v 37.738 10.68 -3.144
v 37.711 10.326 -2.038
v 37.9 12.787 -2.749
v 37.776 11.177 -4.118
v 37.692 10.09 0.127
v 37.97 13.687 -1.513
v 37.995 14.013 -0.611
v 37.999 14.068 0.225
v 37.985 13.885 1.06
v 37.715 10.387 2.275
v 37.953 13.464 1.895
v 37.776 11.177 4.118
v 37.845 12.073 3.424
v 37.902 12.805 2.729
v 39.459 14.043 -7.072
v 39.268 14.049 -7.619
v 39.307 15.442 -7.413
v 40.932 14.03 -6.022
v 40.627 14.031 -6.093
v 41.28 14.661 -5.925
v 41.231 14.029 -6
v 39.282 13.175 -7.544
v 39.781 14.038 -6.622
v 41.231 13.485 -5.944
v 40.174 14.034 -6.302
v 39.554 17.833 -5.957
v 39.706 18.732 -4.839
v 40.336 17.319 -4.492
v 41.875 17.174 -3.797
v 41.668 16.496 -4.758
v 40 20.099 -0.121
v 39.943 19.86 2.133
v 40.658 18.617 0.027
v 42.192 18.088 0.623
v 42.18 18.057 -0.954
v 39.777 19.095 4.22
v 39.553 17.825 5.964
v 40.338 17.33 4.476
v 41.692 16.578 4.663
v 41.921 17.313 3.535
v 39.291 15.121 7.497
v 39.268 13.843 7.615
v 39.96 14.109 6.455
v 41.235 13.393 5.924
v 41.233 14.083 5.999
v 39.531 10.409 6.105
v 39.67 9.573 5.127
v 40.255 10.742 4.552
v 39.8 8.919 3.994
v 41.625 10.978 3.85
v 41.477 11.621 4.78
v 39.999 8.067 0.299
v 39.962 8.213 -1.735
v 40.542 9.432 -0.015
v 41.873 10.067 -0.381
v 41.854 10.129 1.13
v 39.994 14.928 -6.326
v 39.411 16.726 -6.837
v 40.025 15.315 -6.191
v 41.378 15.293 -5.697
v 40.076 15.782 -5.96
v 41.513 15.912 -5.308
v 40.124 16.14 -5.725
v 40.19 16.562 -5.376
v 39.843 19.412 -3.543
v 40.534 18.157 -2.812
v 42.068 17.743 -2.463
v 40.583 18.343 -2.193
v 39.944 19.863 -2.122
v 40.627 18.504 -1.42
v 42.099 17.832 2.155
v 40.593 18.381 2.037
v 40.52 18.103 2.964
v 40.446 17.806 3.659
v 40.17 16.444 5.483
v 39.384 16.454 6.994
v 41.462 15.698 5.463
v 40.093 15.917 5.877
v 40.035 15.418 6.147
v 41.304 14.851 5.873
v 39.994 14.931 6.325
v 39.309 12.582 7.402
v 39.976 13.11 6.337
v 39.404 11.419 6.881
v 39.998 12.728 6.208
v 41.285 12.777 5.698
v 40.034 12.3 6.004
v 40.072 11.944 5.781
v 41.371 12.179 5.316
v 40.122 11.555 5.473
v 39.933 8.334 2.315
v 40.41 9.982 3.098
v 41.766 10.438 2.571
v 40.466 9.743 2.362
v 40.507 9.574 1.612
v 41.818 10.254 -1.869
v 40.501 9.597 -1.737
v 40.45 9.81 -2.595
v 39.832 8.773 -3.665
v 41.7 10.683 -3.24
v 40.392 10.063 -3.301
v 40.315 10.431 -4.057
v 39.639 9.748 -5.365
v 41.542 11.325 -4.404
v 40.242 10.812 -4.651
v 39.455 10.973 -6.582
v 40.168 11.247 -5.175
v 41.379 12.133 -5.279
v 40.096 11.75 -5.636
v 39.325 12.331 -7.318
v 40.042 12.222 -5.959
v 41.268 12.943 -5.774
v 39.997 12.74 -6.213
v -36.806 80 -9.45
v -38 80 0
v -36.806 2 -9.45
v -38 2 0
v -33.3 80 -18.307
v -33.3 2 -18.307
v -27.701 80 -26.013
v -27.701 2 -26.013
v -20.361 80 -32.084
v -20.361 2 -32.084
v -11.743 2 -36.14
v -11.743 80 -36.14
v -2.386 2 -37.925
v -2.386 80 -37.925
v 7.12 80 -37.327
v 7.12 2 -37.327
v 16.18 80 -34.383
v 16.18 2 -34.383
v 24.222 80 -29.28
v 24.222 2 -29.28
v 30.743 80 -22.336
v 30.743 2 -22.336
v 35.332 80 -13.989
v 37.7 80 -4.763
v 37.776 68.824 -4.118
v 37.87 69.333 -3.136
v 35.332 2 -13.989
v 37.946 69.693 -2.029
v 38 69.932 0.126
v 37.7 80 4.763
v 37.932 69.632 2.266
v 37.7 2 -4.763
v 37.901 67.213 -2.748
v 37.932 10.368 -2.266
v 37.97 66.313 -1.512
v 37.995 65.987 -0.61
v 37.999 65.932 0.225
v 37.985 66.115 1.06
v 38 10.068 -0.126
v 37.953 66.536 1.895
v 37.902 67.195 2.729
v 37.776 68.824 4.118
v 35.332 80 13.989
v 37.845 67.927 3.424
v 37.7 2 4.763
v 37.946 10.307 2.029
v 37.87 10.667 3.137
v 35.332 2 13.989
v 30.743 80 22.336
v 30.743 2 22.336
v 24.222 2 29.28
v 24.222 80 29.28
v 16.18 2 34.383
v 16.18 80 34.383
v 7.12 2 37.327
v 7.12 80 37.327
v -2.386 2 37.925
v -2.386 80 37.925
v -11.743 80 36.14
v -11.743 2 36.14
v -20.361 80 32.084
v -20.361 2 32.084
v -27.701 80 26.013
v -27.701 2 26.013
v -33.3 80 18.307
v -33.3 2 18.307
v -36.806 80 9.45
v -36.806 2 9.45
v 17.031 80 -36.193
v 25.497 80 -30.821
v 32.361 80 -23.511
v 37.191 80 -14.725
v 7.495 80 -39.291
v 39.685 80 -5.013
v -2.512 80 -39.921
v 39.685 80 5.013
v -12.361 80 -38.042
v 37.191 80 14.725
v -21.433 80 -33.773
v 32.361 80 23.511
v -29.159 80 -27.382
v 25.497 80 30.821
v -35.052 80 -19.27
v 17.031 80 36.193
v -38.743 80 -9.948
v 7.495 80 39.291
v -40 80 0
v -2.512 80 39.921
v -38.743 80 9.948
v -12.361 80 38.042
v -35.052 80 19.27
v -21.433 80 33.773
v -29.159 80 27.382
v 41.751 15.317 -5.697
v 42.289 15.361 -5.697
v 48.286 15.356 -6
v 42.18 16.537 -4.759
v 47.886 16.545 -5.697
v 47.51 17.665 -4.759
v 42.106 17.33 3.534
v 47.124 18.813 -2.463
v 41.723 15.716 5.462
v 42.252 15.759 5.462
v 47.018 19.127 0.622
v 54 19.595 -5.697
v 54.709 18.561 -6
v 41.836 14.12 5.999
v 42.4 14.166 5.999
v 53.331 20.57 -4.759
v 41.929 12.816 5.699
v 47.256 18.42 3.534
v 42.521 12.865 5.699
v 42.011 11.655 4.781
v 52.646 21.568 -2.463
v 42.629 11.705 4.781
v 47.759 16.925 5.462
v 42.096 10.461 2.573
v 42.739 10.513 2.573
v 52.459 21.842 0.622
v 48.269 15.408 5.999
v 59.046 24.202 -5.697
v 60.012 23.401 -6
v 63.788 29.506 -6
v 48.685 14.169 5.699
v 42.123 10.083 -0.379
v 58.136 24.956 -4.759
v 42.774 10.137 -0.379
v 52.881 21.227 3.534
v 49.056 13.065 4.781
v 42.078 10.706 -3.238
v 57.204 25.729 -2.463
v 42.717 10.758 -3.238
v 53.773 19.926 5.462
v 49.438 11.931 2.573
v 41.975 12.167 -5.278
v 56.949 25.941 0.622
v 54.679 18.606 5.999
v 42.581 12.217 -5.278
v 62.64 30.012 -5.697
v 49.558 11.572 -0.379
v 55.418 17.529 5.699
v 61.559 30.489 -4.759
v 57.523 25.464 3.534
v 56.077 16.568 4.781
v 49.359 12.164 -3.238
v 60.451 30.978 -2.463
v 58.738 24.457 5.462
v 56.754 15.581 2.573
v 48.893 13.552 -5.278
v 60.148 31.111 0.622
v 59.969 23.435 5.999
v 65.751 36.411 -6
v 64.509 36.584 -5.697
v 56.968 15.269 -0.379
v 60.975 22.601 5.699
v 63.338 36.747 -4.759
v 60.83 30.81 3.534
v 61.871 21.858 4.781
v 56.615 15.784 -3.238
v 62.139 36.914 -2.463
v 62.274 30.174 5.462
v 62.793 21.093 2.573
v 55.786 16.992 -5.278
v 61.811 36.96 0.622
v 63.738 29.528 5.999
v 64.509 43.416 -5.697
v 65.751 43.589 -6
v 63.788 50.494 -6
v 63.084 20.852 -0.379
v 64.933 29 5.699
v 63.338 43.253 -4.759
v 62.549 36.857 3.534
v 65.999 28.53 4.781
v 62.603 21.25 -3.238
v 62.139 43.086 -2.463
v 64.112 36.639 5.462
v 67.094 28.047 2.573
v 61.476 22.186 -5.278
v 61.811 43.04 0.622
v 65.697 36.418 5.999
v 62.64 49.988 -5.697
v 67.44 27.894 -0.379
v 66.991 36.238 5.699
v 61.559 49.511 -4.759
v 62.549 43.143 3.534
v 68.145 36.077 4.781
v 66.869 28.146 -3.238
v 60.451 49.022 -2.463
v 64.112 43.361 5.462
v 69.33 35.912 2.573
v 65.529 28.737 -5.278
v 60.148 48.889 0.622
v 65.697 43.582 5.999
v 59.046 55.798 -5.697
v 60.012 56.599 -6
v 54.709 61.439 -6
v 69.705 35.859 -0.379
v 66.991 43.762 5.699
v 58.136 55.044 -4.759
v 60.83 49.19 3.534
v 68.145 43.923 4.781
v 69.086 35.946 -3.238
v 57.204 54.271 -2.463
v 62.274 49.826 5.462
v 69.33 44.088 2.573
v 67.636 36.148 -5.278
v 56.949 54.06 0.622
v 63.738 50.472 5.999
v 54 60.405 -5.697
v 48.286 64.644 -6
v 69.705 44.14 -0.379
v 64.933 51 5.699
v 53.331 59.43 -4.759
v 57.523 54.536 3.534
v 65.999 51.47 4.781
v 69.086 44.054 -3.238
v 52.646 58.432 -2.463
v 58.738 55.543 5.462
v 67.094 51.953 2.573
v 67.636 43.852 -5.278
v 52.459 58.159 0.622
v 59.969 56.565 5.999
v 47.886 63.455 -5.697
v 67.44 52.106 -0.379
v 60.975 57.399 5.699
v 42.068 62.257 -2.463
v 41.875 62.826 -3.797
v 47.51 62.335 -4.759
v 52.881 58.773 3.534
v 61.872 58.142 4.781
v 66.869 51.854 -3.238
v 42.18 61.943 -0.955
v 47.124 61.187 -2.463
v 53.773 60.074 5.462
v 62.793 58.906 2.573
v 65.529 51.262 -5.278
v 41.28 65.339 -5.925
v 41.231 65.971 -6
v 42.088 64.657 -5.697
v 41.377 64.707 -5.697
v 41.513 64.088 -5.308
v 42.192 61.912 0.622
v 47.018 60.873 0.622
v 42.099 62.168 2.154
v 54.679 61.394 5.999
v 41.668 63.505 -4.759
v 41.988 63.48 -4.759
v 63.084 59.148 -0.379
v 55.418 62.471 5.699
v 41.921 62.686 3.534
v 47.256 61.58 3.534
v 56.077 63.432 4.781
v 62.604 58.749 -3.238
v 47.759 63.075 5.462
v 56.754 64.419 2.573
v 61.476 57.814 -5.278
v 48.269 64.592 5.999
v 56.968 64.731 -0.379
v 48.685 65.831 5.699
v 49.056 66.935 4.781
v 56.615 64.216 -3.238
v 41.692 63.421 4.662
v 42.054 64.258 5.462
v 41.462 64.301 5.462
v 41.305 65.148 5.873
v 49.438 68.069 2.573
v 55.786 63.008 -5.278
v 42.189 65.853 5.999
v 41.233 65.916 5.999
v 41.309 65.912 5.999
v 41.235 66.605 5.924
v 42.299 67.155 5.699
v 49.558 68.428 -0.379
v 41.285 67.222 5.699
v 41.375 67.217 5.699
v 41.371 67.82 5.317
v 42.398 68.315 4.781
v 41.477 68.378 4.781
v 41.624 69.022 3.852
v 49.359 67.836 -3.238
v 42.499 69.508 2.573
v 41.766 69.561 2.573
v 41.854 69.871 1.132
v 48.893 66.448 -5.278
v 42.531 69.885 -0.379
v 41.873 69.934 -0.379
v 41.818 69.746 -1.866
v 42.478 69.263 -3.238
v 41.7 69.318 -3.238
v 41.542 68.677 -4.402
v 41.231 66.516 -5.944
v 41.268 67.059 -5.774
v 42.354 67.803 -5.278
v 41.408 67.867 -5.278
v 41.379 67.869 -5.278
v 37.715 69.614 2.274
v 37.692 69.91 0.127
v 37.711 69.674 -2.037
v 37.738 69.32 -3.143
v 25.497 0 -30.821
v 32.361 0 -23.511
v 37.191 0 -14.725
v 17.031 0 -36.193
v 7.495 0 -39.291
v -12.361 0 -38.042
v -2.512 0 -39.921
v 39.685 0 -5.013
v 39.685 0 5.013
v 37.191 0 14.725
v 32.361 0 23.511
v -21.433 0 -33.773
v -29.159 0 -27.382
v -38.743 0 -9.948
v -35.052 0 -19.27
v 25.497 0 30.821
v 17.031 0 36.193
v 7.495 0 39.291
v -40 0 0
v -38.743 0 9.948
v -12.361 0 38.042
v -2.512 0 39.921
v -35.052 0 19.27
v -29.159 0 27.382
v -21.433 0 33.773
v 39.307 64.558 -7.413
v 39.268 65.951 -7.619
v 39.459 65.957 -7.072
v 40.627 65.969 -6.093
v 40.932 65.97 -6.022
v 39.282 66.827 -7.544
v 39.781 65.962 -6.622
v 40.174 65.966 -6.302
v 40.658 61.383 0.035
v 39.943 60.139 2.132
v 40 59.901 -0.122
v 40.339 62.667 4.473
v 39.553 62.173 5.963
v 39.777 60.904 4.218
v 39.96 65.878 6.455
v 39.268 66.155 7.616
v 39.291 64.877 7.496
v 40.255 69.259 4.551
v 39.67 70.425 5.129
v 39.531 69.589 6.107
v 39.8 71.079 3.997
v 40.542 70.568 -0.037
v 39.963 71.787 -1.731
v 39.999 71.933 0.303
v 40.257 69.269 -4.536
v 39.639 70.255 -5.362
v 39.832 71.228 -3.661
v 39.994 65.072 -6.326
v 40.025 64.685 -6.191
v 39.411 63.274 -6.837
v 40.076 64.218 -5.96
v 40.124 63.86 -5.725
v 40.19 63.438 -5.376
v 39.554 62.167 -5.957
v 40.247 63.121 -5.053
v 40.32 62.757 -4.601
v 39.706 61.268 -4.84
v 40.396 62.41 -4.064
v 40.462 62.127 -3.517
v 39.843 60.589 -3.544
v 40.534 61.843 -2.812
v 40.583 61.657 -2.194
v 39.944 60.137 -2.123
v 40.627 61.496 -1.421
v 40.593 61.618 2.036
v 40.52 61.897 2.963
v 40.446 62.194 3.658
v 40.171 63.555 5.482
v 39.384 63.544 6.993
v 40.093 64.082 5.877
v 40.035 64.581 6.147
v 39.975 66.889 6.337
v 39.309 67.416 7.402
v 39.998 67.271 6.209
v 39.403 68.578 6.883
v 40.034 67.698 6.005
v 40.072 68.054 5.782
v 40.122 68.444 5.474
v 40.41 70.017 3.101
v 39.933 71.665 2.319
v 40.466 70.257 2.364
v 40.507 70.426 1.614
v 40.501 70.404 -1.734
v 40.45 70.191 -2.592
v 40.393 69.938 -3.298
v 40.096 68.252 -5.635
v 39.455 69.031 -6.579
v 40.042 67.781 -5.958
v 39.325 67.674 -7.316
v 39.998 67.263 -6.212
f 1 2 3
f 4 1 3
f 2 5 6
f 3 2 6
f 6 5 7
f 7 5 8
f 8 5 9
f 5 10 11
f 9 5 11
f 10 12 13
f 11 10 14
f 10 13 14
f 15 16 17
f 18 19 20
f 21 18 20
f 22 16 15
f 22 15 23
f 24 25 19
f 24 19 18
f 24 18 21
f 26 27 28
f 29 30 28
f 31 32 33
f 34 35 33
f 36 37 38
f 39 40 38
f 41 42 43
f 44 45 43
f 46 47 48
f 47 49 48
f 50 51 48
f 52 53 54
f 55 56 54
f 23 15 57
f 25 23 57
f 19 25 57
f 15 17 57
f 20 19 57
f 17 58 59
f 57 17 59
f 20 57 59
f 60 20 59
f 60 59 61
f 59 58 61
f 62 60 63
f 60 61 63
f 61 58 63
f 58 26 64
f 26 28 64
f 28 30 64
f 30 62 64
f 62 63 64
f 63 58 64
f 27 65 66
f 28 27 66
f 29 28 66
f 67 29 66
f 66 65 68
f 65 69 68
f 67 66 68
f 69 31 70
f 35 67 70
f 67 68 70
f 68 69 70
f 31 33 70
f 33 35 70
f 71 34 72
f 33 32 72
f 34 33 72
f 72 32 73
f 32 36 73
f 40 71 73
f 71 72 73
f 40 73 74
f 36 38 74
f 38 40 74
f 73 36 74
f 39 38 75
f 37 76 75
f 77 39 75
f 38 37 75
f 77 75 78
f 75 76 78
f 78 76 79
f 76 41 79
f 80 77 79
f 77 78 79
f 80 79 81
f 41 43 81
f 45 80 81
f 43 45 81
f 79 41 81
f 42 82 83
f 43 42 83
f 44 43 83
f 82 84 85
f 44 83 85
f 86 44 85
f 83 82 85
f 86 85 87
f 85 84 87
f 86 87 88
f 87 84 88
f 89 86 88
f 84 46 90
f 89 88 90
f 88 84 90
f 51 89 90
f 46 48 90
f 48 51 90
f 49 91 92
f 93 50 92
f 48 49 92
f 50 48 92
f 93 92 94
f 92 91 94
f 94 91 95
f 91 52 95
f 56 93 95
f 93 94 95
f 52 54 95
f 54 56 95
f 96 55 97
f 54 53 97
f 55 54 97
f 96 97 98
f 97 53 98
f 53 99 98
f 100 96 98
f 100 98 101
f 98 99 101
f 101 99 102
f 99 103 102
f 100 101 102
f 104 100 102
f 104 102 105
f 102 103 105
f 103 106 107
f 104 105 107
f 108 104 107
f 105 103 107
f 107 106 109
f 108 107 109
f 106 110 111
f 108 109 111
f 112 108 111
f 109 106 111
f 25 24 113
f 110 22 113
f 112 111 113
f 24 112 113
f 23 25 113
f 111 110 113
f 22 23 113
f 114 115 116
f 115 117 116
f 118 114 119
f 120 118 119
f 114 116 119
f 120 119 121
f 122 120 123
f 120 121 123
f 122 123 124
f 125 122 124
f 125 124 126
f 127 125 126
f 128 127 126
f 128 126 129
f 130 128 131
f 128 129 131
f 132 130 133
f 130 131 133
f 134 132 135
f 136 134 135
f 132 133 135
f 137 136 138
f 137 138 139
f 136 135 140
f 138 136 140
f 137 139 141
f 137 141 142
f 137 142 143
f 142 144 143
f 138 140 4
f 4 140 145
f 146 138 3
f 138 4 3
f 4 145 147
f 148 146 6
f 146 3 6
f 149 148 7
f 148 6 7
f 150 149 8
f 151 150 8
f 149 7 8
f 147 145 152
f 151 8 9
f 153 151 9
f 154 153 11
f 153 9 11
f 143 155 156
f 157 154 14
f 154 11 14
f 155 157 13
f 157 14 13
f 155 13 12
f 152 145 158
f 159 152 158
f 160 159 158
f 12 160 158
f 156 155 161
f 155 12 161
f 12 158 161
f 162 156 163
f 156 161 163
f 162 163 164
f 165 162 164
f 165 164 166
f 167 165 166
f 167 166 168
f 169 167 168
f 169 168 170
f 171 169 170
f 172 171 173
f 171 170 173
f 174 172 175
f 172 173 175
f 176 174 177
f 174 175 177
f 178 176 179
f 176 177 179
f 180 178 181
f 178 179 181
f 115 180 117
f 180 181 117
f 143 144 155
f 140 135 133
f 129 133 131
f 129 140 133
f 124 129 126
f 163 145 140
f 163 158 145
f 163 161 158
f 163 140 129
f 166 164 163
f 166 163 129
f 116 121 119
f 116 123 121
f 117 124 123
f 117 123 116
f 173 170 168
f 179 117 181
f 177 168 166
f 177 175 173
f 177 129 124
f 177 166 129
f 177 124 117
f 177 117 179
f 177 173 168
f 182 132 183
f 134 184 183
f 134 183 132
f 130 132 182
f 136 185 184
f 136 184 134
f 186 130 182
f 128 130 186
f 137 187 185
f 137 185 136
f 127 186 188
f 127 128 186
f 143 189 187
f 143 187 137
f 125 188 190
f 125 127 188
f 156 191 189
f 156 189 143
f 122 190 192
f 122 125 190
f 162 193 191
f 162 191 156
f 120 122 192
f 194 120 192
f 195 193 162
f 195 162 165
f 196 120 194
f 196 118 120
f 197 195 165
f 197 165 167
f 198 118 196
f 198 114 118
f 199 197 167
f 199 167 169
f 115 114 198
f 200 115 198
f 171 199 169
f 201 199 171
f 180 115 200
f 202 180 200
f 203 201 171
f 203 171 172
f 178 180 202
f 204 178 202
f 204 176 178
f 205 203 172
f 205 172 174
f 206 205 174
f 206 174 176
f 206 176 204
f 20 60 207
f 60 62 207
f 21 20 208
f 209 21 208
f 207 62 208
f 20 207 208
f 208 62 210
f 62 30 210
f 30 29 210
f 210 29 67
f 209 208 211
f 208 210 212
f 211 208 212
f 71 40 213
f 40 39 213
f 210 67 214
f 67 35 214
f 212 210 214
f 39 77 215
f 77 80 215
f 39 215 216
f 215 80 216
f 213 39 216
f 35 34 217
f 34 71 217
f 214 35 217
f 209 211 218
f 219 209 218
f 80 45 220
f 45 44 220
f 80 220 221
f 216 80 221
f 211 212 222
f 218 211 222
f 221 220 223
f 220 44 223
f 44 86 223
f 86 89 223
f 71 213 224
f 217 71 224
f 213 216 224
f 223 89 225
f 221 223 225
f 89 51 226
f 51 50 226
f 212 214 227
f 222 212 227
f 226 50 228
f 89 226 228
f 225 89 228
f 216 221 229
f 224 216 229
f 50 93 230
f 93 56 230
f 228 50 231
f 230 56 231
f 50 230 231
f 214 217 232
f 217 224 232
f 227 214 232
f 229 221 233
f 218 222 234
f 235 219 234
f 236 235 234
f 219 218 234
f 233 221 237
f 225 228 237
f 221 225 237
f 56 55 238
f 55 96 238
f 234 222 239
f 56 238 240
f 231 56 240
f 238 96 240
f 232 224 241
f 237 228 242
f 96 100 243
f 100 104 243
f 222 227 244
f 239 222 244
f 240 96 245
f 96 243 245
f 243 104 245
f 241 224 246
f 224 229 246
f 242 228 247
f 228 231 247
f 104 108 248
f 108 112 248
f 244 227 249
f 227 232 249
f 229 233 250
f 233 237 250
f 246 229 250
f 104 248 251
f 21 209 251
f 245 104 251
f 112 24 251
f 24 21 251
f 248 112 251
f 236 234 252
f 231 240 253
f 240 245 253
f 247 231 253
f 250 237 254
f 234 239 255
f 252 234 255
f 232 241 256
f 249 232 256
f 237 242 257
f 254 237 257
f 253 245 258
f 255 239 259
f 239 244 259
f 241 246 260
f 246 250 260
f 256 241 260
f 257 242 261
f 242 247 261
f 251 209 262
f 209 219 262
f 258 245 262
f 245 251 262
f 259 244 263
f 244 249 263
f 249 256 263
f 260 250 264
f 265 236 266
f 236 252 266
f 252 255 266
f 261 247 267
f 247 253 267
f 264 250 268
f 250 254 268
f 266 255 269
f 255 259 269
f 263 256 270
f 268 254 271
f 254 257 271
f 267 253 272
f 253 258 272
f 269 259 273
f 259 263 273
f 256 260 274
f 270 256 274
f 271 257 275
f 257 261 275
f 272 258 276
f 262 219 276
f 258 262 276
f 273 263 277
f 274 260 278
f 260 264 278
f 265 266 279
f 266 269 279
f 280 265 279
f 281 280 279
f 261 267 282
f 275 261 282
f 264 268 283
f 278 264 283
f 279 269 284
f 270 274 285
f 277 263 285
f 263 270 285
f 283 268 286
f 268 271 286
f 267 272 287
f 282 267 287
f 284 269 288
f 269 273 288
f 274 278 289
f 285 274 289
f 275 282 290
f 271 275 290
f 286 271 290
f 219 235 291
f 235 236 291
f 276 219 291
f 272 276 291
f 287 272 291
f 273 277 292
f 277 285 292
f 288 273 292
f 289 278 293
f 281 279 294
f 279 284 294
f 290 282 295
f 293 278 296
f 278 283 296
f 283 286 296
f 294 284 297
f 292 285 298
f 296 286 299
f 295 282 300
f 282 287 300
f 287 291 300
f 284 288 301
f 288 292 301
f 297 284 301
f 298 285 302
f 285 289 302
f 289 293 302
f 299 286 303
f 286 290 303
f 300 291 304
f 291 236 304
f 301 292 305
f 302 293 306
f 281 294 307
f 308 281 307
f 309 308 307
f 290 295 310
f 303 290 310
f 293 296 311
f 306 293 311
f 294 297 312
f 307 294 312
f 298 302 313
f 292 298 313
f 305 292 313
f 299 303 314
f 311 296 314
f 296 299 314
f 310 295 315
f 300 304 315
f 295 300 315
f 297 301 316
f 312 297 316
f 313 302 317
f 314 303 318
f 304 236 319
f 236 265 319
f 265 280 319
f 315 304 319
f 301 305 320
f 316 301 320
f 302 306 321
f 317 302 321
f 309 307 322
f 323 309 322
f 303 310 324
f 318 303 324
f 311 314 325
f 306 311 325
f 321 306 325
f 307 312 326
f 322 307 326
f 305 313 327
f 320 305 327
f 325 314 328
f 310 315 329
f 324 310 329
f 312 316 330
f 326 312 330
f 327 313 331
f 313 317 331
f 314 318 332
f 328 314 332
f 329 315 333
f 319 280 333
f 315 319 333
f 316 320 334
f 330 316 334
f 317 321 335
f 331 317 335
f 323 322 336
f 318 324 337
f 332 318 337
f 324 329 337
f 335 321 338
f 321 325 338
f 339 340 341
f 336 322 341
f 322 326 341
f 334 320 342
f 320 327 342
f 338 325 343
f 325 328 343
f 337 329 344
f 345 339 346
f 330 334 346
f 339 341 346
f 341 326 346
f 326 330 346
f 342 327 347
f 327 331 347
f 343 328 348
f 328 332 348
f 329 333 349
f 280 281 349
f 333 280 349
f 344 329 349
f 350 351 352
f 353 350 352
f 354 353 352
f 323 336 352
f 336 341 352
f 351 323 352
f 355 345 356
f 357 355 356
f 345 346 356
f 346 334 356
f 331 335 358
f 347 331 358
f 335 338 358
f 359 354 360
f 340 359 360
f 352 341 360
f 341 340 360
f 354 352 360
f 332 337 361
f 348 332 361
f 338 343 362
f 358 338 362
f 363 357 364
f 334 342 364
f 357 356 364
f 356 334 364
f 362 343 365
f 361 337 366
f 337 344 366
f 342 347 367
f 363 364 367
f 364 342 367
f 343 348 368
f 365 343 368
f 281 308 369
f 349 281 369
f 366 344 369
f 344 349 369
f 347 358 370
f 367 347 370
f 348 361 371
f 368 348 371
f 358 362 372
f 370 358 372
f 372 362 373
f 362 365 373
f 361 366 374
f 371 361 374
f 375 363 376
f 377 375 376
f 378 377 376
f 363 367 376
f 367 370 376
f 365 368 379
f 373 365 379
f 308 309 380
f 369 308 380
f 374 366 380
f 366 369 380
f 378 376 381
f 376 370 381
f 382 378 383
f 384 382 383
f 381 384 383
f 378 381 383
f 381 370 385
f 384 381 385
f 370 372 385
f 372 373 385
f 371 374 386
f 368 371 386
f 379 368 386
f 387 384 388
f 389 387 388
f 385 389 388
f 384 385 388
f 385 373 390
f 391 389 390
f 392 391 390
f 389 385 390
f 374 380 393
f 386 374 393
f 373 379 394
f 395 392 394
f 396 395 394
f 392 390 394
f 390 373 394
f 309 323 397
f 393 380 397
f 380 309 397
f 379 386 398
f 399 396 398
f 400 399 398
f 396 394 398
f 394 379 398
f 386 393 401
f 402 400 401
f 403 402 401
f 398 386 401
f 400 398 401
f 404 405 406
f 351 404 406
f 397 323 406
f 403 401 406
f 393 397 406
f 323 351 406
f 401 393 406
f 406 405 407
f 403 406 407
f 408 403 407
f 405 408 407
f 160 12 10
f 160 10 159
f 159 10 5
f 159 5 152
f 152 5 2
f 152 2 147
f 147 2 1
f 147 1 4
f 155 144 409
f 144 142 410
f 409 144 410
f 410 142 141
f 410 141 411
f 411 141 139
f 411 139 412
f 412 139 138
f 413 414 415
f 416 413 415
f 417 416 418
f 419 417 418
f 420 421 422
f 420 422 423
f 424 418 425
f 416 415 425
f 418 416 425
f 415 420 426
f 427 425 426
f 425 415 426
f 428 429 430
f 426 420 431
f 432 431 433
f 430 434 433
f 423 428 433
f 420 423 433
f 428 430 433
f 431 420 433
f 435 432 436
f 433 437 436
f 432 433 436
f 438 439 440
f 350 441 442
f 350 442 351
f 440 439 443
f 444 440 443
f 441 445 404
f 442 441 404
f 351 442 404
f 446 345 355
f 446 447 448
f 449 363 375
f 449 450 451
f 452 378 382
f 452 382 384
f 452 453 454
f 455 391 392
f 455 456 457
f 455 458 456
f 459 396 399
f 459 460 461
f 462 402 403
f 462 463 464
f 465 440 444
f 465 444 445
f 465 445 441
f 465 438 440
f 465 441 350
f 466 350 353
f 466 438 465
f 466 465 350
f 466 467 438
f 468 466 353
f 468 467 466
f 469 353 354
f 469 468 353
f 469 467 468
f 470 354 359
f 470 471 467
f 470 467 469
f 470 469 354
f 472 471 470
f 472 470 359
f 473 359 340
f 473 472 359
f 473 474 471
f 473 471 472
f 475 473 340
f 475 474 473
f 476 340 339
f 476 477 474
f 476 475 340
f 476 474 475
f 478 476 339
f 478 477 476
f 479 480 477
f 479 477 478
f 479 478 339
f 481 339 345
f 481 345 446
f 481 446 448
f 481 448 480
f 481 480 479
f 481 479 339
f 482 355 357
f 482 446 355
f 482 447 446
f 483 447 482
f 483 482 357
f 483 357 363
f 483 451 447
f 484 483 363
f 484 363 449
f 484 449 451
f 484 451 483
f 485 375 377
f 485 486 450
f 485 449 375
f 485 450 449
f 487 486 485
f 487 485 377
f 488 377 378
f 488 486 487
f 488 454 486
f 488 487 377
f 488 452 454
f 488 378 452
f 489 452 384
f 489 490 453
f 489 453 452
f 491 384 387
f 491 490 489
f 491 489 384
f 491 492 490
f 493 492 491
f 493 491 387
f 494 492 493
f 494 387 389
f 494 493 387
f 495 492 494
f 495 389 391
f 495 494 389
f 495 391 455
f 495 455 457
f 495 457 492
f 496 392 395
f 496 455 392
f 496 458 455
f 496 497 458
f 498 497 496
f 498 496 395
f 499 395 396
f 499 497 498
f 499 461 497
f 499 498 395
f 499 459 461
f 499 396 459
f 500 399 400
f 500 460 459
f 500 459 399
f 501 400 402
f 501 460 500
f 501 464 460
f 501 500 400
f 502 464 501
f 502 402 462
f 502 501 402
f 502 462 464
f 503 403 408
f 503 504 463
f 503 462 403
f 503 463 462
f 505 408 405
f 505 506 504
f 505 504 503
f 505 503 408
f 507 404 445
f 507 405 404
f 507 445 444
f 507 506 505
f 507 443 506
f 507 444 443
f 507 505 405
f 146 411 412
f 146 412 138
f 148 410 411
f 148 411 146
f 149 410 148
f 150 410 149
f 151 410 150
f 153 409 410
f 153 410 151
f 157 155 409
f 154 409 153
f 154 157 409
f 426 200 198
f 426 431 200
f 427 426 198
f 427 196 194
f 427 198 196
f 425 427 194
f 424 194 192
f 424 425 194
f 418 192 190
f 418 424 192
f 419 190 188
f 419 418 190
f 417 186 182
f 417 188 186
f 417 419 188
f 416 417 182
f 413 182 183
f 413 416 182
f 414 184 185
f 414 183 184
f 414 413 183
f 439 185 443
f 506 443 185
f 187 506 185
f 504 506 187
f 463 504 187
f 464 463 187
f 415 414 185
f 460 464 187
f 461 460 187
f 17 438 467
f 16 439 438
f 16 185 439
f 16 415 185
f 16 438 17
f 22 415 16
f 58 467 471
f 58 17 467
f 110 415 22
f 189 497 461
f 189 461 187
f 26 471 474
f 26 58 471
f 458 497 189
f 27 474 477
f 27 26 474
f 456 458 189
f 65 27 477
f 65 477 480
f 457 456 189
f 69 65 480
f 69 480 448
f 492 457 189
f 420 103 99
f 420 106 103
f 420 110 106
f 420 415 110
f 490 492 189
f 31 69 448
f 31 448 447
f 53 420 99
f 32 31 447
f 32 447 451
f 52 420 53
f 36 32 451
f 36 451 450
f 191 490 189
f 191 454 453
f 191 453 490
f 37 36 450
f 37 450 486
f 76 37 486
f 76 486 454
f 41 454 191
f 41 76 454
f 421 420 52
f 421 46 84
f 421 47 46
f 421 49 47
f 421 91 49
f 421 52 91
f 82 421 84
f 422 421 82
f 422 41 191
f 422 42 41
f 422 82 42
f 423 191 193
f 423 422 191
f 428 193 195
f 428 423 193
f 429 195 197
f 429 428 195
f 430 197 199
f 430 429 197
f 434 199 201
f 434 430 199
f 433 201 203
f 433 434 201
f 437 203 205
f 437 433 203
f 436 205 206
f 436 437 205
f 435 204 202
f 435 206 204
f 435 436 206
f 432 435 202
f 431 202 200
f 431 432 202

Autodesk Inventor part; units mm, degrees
ref_plane "YZ Plane" through (0, 0, 0) normal (1, 0, 0) x (0, 1, 0)
sketch "草圖1" plane through (0, 0, 0) normal (0, 1, 0) x (-1, 0, 0)
  circle A0 centre (0, 0) radius 40
  dimension "d0" = 80
extrude "擠出1" add sketch "草圖1" along normal blind 80
shell "薄殼3" thickness 2 removed faces 1 at (12.1058, 80, -2.3153)
sketch "草圖6" plane through (0, 0, 0) normal (0, 0, 1) x (1, 0, 0)
  line L0 (40, 0) -> (40, 80) projected
  arc A0 (38, 14.077) -> (38, 65.923) centre (40, 40) ccw
  line L1 (-40, 0) -> (40, 0) projected
  line L2 (38, 2) -> (38, 80) construction
  point P0 (0, 0)
  dimension "d23" = 52
  dimension "d24" = 40
ref_plane "工作平面2" through (38, 65.923, 0) normal (-0.997, -0.0769, 0) x (0.0769, -0.997, 0)
sketch "草圖7" plane through (38, 65.923, 0) normal (-0.997, -0.0769, 0) x (0.0769, -0.997, 0)
  ellipse E0 centre (0, 0) end of major axis (0, -6) minor radius 4
  point P0 (62.8046, 0)
  dimension "d25" = 4
  dimension "d26" = 6
sweep "掃掠3" add profiles "草圖7" path "草圖6" path curves A0
fillet "圓角5" radius 2 2 edges at (39.5474, 66.0021, 6) (39.5474, 13.9979, 6)
ref_plane "工作平面3" through (0, 0, 70) normal (0, 0, 1) x (1, 0, 0)
sketch "草圖11" plane through (0, 0, 70) normal (0, 0, 1) x (1, 0, 0)
  line L0 (-18.4453, 56.0809) -> (19.5727, 56.0809)
  line L1 (19.5727, 56.0809) -> (19.5727, 18.0629)
  line L2 (19.5727, 18.0629) -> (-18.4453, 18.0629)
  line L3 (-18.4453, 18.0629) -> (-18.4453, 56.0809)
  point P0 (0, 0)
decal "印花2"
properties part number "練習二"
